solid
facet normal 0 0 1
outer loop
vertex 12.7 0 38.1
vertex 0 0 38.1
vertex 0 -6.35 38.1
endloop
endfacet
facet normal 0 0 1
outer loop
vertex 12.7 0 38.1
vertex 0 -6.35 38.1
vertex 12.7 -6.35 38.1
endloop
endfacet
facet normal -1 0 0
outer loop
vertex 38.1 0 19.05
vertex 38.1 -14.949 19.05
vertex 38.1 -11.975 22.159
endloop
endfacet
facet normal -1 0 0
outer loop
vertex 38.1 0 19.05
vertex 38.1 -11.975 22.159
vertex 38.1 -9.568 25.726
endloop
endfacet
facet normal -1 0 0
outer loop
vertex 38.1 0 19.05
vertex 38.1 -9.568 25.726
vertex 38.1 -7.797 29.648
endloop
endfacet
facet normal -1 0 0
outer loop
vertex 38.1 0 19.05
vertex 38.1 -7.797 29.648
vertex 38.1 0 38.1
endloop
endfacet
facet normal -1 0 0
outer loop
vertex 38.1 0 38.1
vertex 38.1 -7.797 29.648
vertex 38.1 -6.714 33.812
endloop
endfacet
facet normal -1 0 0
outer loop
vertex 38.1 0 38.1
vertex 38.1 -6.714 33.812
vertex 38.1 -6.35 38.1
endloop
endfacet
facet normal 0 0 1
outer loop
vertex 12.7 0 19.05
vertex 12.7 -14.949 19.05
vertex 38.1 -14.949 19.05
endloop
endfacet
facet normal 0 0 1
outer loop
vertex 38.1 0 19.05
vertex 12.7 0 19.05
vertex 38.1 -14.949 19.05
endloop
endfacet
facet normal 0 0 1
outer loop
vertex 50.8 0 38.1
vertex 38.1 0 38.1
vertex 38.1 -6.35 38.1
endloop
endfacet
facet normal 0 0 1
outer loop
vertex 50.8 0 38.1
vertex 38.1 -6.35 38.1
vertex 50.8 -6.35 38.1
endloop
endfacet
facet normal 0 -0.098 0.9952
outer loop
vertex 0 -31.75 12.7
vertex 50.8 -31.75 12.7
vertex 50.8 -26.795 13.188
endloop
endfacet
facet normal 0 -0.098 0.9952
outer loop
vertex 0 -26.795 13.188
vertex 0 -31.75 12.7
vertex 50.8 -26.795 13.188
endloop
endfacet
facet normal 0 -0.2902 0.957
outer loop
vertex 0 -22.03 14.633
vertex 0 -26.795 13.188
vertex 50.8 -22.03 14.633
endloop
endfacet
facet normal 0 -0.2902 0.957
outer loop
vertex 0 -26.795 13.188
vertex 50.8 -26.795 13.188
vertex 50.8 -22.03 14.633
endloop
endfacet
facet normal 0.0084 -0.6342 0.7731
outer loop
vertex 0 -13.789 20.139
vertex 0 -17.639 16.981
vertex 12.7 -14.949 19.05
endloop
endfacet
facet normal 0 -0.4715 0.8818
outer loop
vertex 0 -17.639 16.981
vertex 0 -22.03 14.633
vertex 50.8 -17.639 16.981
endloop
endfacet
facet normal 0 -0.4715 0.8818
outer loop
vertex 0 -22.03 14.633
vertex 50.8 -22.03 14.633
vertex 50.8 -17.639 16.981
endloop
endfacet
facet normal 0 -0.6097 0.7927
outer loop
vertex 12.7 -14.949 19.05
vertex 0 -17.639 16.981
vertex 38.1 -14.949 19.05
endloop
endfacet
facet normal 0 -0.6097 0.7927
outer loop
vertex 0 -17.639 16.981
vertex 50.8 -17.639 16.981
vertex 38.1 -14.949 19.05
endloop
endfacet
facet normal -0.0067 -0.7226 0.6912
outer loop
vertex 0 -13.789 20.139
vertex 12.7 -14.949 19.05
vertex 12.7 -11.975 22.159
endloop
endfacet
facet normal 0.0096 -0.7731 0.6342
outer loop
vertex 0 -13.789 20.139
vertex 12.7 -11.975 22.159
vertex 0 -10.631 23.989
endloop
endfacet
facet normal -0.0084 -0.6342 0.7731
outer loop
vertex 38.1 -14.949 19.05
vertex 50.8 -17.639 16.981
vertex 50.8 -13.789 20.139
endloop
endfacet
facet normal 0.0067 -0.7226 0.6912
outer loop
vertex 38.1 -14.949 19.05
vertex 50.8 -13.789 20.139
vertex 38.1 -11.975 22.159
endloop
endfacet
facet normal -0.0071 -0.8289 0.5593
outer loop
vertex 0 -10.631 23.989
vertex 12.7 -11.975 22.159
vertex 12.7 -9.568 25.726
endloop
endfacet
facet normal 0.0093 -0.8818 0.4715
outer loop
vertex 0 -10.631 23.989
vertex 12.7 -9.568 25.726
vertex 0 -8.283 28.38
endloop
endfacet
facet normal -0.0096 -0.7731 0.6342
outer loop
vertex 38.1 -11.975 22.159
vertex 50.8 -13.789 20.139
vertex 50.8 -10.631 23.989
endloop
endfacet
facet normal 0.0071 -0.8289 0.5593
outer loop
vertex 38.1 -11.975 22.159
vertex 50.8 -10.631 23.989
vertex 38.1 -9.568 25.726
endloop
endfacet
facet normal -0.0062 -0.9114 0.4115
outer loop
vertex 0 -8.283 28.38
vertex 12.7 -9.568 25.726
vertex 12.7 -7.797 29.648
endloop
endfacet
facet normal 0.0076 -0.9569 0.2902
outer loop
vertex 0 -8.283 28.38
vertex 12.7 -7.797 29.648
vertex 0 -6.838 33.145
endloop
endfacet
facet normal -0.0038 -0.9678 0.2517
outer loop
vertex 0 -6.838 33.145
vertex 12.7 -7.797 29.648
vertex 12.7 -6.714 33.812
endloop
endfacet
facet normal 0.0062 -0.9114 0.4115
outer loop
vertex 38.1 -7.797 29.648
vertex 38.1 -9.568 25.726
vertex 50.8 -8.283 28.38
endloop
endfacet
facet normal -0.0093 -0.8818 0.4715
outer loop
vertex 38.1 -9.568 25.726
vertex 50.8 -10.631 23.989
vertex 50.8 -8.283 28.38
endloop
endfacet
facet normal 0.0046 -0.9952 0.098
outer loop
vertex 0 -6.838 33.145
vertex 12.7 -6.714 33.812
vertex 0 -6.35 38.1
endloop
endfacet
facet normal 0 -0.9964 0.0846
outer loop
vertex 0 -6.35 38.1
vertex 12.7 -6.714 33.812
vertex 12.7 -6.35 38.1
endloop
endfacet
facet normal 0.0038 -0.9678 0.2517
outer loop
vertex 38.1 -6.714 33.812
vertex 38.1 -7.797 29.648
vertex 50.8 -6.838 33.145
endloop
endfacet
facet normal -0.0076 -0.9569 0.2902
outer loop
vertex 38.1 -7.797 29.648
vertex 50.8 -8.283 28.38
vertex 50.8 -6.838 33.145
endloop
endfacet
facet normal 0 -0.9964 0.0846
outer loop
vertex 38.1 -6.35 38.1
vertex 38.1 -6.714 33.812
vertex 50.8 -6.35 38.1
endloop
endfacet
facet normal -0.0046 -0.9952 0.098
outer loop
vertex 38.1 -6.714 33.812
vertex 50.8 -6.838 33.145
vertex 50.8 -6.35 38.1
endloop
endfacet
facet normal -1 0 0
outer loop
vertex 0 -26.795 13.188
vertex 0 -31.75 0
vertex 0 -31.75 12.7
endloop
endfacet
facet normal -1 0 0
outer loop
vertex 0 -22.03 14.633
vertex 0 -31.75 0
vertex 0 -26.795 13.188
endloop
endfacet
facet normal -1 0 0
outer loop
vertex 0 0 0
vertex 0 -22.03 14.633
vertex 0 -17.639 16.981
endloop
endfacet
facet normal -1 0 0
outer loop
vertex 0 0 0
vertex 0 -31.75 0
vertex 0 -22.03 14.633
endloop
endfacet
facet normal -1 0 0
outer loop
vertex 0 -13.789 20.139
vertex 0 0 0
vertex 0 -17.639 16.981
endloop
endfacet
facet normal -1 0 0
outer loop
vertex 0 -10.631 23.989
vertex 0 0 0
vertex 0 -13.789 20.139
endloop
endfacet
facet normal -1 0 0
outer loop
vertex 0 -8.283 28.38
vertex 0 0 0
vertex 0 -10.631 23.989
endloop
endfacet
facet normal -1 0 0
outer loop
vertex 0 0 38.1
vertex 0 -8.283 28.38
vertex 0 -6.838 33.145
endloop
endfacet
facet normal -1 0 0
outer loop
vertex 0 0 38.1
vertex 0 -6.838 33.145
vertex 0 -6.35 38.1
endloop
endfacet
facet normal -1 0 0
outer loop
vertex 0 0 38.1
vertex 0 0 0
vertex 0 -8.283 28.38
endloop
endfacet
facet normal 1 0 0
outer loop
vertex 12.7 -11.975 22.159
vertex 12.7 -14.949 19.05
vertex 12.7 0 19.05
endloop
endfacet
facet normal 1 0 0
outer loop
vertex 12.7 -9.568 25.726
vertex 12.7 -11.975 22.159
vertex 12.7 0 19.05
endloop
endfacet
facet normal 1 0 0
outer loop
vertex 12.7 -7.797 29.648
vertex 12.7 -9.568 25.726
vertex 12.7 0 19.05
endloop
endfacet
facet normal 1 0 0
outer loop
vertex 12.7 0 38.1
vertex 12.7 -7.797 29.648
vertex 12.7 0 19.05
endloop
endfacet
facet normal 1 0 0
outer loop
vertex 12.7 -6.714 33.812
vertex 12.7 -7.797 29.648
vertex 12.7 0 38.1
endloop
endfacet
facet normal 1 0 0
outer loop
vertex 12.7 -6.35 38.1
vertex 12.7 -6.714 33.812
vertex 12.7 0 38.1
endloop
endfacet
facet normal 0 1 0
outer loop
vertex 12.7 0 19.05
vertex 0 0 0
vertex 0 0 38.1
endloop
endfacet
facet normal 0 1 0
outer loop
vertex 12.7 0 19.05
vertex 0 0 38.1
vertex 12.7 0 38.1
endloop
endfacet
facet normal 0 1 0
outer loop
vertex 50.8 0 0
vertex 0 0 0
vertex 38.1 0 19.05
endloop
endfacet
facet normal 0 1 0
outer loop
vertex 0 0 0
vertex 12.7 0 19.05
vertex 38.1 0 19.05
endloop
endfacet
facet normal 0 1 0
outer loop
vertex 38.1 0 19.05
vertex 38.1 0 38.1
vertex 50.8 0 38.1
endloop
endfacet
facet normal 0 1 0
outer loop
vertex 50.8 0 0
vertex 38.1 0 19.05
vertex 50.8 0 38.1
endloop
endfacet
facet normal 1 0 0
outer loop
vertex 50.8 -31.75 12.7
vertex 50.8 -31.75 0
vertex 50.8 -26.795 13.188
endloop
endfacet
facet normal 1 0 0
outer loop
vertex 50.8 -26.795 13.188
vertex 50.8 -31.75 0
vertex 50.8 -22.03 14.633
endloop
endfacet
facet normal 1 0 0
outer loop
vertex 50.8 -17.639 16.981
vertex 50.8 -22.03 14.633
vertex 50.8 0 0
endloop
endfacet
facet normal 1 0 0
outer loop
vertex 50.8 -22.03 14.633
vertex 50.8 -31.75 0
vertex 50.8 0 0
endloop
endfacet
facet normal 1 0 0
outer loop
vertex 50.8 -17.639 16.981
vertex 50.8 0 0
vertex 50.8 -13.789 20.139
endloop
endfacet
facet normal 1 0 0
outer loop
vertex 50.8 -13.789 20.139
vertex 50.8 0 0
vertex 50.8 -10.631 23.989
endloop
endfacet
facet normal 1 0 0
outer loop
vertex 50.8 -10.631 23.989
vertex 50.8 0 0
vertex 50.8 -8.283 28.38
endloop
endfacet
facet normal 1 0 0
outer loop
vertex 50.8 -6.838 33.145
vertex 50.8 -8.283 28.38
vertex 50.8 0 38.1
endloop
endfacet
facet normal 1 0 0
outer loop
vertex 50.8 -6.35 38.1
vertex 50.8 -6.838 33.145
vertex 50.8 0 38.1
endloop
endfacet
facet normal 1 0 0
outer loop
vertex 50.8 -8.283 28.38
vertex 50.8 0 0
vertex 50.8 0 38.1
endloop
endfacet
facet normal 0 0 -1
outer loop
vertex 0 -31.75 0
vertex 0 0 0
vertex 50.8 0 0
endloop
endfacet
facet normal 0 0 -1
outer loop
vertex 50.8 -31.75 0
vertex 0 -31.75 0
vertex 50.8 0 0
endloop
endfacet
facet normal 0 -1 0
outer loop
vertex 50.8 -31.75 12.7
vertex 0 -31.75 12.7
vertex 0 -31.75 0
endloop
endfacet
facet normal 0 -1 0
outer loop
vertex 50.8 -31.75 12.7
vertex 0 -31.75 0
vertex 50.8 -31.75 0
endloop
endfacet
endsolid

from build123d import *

# Parameters (mm, degrees)
F0_W     = 50.8
F0_H     = 38.1
F1_DEPTH = 31.75
F2_W     = 25.4
F2_H     = 19.05
F3_DEPTH = 31.751
F5_DEPTH = 50.8


with BuildPart() as f1:
    # F0 (on Front) → F1 (new body)
    with BuildSketch(Plane.XZ):
        with Locations((25.4, 19.05)):
            Rectangle(F0_W, F0_H)
    extrude(amount=F1_DEPTH)

    # F2 (on face) → F3 (cut, through all)
    with BuildSketch(Plane.XZ.offset(31.75)):
        with Locations((25.4, 28.575)):
            Rectangle(F2_W, F2_H)
    extrude(amount=-F3_DEPTH, mode=Mode.SUBTRACT)

    # F4 (on face) → F5 (cut)
    with BuildSketch(Plane.YZ.offset(50.8)):
        with BuildLine():
            ThreePointArc((-31.75, 12.7), (-13.789488, 20.139488), (-6.35, 38.1))
            Line((-6.35, 38.1), (-31.75, 38.1))
            Line((-31.75, 38.1), (-31.75, 12.7))
        make_face()
        with BuildLine():
            Line((-31.75, 38.1), (-6.35, 38.1))
            ThreePointArc((-6.35, 38.1), (-49.710512, 56.060512), (-31.75, 12.7))
            Line((-31.75, 12.7), (-31.75, 38.1))
        make_face()
    extrude(amount=-F5_DEPTH, mode=Mode.SUBTRACT)


solid = f1.part
